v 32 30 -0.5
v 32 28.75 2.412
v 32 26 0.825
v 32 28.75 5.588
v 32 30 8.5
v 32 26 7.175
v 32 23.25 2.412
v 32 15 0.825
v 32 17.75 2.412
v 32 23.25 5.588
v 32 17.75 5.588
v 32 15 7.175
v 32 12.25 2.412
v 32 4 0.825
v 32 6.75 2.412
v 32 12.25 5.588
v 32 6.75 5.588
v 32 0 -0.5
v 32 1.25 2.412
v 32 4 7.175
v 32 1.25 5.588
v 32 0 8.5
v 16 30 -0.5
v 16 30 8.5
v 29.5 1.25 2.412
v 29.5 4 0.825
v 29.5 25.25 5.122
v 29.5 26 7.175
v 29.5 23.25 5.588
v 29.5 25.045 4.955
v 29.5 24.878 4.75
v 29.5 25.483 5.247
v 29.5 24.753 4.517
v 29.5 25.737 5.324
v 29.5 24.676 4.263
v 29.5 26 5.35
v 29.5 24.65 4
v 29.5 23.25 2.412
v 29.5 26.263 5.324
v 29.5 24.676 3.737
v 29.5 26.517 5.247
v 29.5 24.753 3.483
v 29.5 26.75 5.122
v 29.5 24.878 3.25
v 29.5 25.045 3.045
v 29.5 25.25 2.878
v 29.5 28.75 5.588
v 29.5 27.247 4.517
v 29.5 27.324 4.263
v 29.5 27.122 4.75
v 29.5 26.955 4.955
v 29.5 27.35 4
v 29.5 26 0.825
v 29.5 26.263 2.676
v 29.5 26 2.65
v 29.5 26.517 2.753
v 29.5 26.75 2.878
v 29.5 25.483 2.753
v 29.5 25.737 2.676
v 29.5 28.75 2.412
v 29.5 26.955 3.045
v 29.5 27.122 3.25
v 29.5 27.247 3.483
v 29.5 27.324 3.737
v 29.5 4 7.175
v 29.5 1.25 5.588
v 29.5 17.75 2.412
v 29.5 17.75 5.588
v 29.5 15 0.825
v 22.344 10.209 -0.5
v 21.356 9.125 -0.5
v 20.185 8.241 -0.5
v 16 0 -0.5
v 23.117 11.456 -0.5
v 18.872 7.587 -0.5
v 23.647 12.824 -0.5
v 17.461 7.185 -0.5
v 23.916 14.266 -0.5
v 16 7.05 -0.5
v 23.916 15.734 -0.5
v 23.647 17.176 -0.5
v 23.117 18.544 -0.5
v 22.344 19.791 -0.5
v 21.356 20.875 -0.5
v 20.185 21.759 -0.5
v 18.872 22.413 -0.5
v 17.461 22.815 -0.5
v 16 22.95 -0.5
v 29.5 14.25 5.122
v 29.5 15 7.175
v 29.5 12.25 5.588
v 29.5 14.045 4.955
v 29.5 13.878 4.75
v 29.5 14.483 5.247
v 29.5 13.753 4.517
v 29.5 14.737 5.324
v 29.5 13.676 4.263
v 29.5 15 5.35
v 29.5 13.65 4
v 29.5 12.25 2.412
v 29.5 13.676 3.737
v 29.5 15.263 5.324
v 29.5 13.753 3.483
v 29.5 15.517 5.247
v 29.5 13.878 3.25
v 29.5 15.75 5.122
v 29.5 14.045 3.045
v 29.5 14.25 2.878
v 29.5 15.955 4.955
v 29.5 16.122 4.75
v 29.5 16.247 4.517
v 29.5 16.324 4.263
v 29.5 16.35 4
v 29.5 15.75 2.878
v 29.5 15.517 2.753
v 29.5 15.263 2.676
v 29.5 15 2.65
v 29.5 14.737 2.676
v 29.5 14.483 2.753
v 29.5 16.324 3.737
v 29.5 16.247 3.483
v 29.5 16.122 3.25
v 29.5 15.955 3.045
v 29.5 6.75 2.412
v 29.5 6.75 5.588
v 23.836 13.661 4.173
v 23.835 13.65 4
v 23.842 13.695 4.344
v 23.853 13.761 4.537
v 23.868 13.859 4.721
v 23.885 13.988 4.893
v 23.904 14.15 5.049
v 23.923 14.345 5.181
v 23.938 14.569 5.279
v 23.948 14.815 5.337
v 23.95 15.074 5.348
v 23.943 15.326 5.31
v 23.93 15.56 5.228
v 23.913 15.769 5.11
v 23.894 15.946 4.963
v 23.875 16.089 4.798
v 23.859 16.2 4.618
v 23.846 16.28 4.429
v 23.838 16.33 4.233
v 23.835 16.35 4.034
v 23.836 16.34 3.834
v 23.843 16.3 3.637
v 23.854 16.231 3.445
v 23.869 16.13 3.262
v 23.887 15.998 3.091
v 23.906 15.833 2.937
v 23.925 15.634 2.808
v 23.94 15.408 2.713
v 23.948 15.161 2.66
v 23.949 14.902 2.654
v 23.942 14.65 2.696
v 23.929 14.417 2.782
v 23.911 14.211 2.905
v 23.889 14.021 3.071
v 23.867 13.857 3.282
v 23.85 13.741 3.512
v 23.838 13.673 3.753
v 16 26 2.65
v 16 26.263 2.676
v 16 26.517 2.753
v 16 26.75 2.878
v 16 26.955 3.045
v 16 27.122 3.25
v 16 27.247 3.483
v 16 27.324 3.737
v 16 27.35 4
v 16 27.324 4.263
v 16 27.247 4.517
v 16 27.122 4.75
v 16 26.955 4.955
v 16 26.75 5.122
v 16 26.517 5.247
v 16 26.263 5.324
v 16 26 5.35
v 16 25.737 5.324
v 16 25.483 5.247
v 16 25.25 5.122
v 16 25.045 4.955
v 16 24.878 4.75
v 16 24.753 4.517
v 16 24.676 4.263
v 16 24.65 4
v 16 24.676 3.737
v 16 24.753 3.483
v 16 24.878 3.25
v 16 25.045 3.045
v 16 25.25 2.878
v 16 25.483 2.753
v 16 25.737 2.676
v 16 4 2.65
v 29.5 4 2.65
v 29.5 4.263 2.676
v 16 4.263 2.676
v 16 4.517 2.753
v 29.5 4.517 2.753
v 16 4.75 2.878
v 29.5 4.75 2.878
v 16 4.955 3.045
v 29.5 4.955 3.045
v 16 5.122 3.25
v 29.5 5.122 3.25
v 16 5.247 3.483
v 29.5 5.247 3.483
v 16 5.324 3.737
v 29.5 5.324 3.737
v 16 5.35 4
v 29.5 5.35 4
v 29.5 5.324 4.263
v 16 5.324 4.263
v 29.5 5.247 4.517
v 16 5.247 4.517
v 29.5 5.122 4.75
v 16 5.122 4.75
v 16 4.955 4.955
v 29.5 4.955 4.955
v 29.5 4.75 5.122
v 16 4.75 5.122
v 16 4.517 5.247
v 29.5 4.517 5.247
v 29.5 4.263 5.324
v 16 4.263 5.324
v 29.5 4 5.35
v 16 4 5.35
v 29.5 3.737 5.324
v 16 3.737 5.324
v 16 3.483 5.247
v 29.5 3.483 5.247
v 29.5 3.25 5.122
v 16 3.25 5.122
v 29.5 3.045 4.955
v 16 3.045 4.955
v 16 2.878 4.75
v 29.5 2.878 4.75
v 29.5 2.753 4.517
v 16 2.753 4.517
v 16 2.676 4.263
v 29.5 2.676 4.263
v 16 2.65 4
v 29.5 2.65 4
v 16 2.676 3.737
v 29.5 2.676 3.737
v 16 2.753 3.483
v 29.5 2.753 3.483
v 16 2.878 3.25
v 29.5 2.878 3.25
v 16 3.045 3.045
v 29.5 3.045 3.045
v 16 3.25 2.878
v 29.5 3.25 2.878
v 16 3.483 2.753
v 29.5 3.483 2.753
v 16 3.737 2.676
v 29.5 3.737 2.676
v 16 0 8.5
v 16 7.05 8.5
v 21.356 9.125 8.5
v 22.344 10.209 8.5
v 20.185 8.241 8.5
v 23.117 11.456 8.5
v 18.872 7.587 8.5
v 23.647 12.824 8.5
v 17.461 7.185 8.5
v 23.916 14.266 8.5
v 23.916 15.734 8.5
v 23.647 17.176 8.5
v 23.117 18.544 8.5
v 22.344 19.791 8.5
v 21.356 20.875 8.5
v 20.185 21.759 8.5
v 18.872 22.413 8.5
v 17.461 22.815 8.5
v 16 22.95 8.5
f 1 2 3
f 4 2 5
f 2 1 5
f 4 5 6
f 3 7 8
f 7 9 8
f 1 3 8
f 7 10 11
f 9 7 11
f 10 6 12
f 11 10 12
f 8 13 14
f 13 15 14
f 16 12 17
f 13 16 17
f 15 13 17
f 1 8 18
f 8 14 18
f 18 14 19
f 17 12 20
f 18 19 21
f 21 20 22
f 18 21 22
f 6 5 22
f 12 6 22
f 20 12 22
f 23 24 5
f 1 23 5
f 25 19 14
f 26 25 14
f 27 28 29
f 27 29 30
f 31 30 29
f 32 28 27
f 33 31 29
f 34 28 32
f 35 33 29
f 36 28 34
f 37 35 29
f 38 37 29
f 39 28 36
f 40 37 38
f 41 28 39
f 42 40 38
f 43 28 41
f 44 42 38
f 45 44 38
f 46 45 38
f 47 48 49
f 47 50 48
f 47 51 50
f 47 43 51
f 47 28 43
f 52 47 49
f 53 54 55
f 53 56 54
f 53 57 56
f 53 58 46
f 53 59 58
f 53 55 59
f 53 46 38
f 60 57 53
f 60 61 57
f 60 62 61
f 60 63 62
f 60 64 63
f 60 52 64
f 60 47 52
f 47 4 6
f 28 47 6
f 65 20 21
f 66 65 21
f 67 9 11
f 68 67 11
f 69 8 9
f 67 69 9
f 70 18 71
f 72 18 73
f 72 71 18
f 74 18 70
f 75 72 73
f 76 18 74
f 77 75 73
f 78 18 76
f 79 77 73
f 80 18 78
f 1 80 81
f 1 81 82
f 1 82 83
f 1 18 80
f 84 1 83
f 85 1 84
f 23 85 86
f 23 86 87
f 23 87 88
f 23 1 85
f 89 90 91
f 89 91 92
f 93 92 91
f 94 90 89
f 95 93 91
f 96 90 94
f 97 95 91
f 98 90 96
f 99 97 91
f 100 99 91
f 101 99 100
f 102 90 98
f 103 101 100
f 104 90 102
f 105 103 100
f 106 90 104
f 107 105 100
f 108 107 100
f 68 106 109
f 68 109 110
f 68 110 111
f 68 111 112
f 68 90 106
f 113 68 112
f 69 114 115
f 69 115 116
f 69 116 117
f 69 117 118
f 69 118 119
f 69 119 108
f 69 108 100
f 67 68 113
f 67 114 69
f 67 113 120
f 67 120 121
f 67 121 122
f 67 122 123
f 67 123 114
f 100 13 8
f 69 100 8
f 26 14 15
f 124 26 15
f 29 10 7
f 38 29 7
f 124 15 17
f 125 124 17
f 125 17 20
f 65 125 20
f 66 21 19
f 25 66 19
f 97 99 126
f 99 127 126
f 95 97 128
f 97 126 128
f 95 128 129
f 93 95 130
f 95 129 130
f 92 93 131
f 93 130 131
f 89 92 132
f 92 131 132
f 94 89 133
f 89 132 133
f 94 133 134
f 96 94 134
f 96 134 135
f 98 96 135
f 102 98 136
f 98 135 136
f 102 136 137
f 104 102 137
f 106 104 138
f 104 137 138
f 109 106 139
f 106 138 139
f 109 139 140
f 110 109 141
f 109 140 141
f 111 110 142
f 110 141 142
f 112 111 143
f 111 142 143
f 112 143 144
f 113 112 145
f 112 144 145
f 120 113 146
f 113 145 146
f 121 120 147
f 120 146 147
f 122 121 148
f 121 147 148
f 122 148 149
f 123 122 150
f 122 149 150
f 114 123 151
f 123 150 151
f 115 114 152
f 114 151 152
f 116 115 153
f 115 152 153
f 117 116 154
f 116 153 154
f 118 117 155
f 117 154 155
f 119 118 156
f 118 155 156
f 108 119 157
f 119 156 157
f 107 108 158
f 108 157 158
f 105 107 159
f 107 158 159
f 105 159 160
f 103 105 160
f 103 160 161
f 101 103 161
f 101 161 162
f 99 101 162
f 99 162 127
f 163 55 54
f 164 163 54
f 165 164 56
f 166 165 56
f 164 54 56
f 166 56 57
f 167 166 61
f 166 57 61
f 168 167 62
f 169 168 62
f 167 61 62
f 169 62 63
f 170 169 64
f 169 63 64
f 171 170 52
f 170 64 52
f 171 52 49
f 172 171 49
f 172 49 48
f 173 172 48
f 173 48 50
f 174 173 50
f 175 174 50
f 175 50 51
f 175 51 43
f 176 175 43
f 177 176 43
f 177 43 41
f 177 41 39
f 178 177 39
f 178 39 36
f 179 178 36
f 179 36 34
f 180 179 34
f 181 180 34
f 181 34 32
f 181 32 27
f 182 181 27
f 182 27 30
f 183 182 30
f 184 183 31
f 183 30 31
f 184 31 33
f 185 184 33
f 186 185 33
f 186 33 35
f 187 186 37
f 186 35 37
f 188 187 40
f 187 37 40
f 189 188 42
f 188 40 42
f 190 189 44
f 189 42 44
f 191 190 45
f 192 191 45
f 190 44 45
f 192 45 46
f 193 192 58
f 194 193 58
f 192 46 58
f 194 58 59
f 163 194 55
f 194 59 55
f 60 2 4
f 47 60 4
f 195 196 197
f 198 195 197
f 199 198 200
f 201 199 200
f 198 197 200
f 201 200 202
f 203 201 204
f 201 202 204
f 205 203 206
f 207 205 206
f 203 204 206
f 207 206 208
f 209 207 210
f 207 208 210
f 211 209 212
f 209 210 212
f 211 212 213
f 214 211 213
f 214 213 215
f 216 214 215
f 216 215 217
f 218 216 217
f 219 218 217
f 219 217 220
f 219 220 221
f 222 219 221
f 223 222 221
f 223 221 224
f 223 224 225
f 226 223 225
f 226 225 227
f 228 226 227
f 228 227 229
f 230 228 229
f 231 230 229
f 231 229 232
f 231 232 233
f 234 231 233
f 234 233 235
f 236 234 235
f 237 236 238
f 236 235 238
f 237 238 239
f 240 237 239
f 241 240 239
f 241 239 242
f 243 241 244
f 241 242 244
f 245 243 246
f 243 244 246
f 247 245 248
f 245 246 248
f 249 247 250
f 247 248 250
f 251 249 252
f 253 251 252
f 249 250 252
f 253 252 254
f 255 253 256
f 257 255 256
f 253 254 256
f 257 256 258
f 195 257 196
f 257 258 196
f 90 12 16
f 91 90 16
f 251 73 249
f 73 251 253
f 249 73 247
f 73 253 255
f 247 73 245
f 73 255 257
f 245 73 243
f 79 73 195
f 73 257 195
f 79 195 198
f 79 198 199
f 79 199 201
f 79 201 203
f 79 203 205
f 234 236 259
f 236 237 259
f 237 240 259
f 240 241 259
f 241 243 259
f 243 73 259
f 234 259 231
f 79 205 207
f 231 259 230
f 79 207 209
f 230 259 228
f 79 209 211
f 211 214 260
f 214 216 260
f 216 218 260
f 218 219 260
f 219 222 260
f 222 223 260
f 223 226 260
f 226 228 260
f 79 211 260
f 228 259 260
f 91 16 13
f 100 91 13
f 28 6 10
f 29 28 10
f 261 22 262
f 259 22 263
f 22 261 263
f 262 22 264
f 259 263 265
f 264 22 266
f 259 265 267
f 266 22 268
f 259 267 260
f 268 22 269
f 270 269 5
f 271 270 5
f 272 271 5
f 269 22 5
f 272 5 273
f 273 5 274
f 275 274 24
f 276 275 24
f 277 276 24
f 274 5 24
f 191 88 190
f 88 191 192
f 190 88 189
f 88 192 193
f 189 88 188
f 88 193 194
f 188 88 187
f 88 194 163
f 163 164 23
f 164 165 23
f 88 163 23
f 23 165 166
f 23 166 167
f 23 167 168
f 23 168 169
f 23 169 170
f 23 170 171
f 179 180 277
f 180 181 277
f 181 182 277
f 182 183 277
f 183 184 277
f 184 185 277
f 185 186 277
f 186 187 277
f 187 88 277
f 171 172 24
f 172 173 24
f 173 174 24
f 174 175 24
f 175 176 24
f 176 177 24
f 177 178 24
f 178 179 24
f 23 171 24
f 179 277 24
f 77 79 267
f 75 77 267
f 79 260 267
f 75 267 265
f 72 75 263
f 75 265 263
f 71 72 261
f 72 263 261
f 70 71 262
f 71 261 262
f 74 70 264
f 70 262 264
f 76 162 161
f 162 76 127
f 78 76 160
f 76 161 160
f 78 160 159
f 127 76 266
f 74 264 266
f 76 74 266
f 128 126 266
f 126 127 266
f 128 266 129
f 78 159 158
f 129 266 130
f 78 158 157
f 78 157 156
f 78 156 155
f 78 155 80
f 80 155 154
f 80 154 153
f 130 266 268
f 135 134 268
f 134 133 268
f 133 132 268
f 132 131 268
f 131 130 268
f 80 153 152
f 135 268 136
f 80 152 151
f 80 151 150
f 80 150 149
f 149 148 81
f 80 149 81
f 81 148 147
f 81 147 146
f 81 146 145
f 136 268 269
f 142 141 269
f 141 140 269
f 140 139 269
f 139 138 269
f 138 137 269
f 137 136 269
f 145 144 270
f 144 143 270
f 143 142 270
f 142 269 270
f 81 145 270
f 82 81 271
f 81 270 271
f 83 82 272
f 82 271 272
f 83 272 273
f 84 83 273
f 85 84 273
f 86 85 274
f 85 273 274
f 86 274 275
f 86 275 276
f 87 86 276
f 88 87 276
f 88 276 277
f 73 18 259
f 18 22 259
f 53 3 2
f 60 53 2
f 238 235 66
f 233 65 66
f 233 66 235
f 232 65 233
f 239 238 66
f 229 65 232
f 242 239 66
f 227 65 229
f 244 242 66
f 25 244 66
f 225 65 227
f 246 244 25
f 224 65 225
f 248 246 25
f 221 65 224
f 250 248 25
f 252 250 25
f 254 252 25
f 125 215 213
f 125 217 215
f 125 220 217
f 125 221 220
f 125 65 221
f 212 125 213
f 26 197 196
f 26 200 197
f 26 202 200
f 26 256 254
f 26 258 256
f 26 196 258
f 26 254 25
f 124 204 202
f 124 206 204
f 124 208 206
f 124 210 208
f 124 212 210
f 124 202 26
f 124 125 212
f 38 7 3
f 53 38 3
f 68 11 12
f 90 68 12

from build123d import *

# Parameters (mm, degrees)
IZIM1_R                     = 7.95
Y_KSEKLIK_EKSTR_ZYON1_DEPTH = 8
IZIM2_R                     = 1.35
KES_EKSTR_ZYON1_DEPTH       = 50
IZIM3_R                     = 1.35
KES_EKSTR_ZYON2_DEPTH       = 29
KES_EKSTR_ZYON3_DEPTH       = 10
Y_KSEKLIK_EKSTR_ZYON2_REACH = 46.587
IZIM5_W                     = 5.529758539
IZIM5_H                     = 16.549351305
IZIM6_R                     = 1.35
KES_EKSTR_ZYON4_DEPTH       = 10
KES_EKSTR_ZYON5_DEPTH       = 2.5
Y_KSEKLIK_EKSTR_ZYON3_DEPTH = 0.5


with BuildPart() as part:
    # Çizim1 → Yükseklik-Ekstrüzyon1 (new body)
    with BuildSketch(Plane.XY):
        with BuildLine():
            Line((0, 0), (32, 0))
            Line((32, 0), (32, 8))
            Line((32, 8), (31.5, 8))
            ThreePointArc((31.5, 8), (28.671572875, 9.171572875), (27.5, 12))
            Line((27.5, 12), (27.5, 18))
            ThreePointArc((27.5, 18), (28.671572875, 20.828427125), (31.5, 22))
            Line((31.5, 22), (32, 22))
            Line((32, 22), (32, 30))
            Line((32, 30), (0, 30))
            Line((0, 30), (0, 22))
            Line((0, 22), (0.5, 22))
            ThreePointArc((0.5, 22), (3.328427125, 20.828427125), (4.5, 18))
            Line((4.5, 18), (4.5, 12))
            ThreePointArc((4.5, 12), (3.328427125, 9.171572875), (0.5, 8))
            Line((0.5, 8), (0, 8))
            Line((0, 8), (0, 0))
        make_face()
        with Locations((16, 15)):
            Circle(IZIM1_R, mode=Mode.SUBTRACT)
    extrude(amount=Y_KSEKLIK_EKSTR_ZYON1_DEPTH)

    # Çizim2 → Kes-Ekstrüzyon1 (cut)
    with BuildSketch(Plane(origin=(32, 0, 0), x_dir=(0, 0, -1), z_dir=(1, 0, 0))):
        with Locations((-4, 4)):
            Circle(IZIM2_R)
        with Locations((-4, 26)):
            Circle(IZIM2_R)
    extrude(amount=-KES_EKSTR_ZYON1_DEPTH, mode=Mode.SUBTRACT)

    # Çizim3 → Kes-Ekstrüzyon2 (cut)
    with BuildSketch(Plane.ZY.offset(-4.5)):
        with Locations(Location((4, 15, 0), (0, 0, 270))):
            Circle(IZIM3_R)
    extrude(amount=-KES_EKSTR_ZYON2_DEPTH, mode=Mode.SUBTRACT)

    # Çizim4 → Kes-Ekstrüzyon3 (cut)
    with BuildSketch(Plane(origin=(0, 0, 0), x_dir=(-1, 0, 0), z_dir=(0, 0, -1))):
        Polygon((-16, 30), (-16, 0), (9.241069926, -10.278514345), (11.843794838, 24.557008953), (11.843794838, 39.531622814), align=None)
    extrude(amount=-KES_EKSTR_ZYON3_DEPTH, mode=Mode.SUBTRACT)

    # Yükseklik-Ekstrüzyon2: up to this face of the body (flat: up to its plane)
    y_kseklik_ekstr_zyon2_end = Plane(part.part.faces().sort_by_distance((24.391799767, 15, 8))[0])
    # Çizim5 → Yükseklik-Ekstrüzyon2 (add, up to the picked face)
    with BuildSketch(Plane(origin=(0, 0, 0), x_dir=(-1, 0, 0), z_dir=(0, 0, -1)), mode=Mode.PRIVATE) as y_kseklik_ekstr_zyon2_sk1:
        with Locations((-29.235120731, 13.725324347)):
            Rectangle(IZIM5_W, IZIM5_H)
    y_kseklik_ekstr_zyon2_tool1 = split(extrude(y_kseklik_ekstr_zyon2_sk1.sketch, amount=-Y_KSEKLIK_EKSTR_ZYON2_REACH, mode=Mode.PRIVATE), bisect_by=y_kseklik_ekstr_zyon2_end, keep=Keep.BOTH, mode=Mode.PRIVATE)
    add(y_kseklik_ekstr_zyon2_tool1.solids().sort_by(Axis((29.235121, 13.725324, 0), (0, 0, 1)))[0])

    # Çizim6 → Kes-Ekstrüzyon4 (cut)
    with BuildSketch(Plane.ZY.offset(-26.470241461)):
        with Locations(Location((4, 15, 0), (0, 0, 270))):
            Circle(IZIM6_R)
    extrude(amount=-KES_EKSTR_ZYON4_DEPTH, mode=Mode.SUBTRACT)

    # Çizim7 → Kes-Ekstrüzyon5 (cut)
    with BuildSketch(Plane(origin=(32, 0, 0), x_dir=(0, 0, -1), z_dir=(1, 0, 0))):
        Polygon((-2.41228676, 28.75), (-5.58771324, 28.75), (-7.175426481, 26), (-5.58771324, 23.25), (-2.41228676, 23.25), (-0.824573519, 26), align=None)
        Polygon((-0.824573519, 15), (-2.41228676, 17.75), (-5.58771324, 17.75), (-7.175426481, 15), (-5.58771324, 12.25), (-2.41228676, 12.25), align=None)
        Polygon((-2.41228676, 6.75), (-5.58771324, 6.75), (-7.175426481, 4), (-5.58771324, 1.25), (-2.41228676, 1.25), (-0.824573519, 4), align=None)
    extrude(amount=-KES_EKSTR_ZYON5_DEPTH, mode=Mode.SUBTRACT)

    # Çizim8 → Yükseklik-Ekstrüzyon3 (add)
    with BuildSketch(Plane.XY.offset(8)):
        with BuildLine():
            Line((32, 30), (32, 0))
            Line((32, 0), (16, 0))
            Line((16, 0), (16, 7.05))
            ThreePointArc((16, 7.05), (23.95, 15), (16, 22.95))
            Line((16, 22.95), (16, 30))
            Line((16, 30), (32, 30))
        make_face()
    y_kseklik_ekstr_zyon3 = extrude(amount=Y_KSEKLIK_EKSTR_ZYON3_DEPTH)

    # Aynalama1: Yükseklik-Ekstrüzyon3 across plane
    add(y_kseklik_ekstr_zyon3.mirror(Plane.XY.offset(4)))


solid = part.part
